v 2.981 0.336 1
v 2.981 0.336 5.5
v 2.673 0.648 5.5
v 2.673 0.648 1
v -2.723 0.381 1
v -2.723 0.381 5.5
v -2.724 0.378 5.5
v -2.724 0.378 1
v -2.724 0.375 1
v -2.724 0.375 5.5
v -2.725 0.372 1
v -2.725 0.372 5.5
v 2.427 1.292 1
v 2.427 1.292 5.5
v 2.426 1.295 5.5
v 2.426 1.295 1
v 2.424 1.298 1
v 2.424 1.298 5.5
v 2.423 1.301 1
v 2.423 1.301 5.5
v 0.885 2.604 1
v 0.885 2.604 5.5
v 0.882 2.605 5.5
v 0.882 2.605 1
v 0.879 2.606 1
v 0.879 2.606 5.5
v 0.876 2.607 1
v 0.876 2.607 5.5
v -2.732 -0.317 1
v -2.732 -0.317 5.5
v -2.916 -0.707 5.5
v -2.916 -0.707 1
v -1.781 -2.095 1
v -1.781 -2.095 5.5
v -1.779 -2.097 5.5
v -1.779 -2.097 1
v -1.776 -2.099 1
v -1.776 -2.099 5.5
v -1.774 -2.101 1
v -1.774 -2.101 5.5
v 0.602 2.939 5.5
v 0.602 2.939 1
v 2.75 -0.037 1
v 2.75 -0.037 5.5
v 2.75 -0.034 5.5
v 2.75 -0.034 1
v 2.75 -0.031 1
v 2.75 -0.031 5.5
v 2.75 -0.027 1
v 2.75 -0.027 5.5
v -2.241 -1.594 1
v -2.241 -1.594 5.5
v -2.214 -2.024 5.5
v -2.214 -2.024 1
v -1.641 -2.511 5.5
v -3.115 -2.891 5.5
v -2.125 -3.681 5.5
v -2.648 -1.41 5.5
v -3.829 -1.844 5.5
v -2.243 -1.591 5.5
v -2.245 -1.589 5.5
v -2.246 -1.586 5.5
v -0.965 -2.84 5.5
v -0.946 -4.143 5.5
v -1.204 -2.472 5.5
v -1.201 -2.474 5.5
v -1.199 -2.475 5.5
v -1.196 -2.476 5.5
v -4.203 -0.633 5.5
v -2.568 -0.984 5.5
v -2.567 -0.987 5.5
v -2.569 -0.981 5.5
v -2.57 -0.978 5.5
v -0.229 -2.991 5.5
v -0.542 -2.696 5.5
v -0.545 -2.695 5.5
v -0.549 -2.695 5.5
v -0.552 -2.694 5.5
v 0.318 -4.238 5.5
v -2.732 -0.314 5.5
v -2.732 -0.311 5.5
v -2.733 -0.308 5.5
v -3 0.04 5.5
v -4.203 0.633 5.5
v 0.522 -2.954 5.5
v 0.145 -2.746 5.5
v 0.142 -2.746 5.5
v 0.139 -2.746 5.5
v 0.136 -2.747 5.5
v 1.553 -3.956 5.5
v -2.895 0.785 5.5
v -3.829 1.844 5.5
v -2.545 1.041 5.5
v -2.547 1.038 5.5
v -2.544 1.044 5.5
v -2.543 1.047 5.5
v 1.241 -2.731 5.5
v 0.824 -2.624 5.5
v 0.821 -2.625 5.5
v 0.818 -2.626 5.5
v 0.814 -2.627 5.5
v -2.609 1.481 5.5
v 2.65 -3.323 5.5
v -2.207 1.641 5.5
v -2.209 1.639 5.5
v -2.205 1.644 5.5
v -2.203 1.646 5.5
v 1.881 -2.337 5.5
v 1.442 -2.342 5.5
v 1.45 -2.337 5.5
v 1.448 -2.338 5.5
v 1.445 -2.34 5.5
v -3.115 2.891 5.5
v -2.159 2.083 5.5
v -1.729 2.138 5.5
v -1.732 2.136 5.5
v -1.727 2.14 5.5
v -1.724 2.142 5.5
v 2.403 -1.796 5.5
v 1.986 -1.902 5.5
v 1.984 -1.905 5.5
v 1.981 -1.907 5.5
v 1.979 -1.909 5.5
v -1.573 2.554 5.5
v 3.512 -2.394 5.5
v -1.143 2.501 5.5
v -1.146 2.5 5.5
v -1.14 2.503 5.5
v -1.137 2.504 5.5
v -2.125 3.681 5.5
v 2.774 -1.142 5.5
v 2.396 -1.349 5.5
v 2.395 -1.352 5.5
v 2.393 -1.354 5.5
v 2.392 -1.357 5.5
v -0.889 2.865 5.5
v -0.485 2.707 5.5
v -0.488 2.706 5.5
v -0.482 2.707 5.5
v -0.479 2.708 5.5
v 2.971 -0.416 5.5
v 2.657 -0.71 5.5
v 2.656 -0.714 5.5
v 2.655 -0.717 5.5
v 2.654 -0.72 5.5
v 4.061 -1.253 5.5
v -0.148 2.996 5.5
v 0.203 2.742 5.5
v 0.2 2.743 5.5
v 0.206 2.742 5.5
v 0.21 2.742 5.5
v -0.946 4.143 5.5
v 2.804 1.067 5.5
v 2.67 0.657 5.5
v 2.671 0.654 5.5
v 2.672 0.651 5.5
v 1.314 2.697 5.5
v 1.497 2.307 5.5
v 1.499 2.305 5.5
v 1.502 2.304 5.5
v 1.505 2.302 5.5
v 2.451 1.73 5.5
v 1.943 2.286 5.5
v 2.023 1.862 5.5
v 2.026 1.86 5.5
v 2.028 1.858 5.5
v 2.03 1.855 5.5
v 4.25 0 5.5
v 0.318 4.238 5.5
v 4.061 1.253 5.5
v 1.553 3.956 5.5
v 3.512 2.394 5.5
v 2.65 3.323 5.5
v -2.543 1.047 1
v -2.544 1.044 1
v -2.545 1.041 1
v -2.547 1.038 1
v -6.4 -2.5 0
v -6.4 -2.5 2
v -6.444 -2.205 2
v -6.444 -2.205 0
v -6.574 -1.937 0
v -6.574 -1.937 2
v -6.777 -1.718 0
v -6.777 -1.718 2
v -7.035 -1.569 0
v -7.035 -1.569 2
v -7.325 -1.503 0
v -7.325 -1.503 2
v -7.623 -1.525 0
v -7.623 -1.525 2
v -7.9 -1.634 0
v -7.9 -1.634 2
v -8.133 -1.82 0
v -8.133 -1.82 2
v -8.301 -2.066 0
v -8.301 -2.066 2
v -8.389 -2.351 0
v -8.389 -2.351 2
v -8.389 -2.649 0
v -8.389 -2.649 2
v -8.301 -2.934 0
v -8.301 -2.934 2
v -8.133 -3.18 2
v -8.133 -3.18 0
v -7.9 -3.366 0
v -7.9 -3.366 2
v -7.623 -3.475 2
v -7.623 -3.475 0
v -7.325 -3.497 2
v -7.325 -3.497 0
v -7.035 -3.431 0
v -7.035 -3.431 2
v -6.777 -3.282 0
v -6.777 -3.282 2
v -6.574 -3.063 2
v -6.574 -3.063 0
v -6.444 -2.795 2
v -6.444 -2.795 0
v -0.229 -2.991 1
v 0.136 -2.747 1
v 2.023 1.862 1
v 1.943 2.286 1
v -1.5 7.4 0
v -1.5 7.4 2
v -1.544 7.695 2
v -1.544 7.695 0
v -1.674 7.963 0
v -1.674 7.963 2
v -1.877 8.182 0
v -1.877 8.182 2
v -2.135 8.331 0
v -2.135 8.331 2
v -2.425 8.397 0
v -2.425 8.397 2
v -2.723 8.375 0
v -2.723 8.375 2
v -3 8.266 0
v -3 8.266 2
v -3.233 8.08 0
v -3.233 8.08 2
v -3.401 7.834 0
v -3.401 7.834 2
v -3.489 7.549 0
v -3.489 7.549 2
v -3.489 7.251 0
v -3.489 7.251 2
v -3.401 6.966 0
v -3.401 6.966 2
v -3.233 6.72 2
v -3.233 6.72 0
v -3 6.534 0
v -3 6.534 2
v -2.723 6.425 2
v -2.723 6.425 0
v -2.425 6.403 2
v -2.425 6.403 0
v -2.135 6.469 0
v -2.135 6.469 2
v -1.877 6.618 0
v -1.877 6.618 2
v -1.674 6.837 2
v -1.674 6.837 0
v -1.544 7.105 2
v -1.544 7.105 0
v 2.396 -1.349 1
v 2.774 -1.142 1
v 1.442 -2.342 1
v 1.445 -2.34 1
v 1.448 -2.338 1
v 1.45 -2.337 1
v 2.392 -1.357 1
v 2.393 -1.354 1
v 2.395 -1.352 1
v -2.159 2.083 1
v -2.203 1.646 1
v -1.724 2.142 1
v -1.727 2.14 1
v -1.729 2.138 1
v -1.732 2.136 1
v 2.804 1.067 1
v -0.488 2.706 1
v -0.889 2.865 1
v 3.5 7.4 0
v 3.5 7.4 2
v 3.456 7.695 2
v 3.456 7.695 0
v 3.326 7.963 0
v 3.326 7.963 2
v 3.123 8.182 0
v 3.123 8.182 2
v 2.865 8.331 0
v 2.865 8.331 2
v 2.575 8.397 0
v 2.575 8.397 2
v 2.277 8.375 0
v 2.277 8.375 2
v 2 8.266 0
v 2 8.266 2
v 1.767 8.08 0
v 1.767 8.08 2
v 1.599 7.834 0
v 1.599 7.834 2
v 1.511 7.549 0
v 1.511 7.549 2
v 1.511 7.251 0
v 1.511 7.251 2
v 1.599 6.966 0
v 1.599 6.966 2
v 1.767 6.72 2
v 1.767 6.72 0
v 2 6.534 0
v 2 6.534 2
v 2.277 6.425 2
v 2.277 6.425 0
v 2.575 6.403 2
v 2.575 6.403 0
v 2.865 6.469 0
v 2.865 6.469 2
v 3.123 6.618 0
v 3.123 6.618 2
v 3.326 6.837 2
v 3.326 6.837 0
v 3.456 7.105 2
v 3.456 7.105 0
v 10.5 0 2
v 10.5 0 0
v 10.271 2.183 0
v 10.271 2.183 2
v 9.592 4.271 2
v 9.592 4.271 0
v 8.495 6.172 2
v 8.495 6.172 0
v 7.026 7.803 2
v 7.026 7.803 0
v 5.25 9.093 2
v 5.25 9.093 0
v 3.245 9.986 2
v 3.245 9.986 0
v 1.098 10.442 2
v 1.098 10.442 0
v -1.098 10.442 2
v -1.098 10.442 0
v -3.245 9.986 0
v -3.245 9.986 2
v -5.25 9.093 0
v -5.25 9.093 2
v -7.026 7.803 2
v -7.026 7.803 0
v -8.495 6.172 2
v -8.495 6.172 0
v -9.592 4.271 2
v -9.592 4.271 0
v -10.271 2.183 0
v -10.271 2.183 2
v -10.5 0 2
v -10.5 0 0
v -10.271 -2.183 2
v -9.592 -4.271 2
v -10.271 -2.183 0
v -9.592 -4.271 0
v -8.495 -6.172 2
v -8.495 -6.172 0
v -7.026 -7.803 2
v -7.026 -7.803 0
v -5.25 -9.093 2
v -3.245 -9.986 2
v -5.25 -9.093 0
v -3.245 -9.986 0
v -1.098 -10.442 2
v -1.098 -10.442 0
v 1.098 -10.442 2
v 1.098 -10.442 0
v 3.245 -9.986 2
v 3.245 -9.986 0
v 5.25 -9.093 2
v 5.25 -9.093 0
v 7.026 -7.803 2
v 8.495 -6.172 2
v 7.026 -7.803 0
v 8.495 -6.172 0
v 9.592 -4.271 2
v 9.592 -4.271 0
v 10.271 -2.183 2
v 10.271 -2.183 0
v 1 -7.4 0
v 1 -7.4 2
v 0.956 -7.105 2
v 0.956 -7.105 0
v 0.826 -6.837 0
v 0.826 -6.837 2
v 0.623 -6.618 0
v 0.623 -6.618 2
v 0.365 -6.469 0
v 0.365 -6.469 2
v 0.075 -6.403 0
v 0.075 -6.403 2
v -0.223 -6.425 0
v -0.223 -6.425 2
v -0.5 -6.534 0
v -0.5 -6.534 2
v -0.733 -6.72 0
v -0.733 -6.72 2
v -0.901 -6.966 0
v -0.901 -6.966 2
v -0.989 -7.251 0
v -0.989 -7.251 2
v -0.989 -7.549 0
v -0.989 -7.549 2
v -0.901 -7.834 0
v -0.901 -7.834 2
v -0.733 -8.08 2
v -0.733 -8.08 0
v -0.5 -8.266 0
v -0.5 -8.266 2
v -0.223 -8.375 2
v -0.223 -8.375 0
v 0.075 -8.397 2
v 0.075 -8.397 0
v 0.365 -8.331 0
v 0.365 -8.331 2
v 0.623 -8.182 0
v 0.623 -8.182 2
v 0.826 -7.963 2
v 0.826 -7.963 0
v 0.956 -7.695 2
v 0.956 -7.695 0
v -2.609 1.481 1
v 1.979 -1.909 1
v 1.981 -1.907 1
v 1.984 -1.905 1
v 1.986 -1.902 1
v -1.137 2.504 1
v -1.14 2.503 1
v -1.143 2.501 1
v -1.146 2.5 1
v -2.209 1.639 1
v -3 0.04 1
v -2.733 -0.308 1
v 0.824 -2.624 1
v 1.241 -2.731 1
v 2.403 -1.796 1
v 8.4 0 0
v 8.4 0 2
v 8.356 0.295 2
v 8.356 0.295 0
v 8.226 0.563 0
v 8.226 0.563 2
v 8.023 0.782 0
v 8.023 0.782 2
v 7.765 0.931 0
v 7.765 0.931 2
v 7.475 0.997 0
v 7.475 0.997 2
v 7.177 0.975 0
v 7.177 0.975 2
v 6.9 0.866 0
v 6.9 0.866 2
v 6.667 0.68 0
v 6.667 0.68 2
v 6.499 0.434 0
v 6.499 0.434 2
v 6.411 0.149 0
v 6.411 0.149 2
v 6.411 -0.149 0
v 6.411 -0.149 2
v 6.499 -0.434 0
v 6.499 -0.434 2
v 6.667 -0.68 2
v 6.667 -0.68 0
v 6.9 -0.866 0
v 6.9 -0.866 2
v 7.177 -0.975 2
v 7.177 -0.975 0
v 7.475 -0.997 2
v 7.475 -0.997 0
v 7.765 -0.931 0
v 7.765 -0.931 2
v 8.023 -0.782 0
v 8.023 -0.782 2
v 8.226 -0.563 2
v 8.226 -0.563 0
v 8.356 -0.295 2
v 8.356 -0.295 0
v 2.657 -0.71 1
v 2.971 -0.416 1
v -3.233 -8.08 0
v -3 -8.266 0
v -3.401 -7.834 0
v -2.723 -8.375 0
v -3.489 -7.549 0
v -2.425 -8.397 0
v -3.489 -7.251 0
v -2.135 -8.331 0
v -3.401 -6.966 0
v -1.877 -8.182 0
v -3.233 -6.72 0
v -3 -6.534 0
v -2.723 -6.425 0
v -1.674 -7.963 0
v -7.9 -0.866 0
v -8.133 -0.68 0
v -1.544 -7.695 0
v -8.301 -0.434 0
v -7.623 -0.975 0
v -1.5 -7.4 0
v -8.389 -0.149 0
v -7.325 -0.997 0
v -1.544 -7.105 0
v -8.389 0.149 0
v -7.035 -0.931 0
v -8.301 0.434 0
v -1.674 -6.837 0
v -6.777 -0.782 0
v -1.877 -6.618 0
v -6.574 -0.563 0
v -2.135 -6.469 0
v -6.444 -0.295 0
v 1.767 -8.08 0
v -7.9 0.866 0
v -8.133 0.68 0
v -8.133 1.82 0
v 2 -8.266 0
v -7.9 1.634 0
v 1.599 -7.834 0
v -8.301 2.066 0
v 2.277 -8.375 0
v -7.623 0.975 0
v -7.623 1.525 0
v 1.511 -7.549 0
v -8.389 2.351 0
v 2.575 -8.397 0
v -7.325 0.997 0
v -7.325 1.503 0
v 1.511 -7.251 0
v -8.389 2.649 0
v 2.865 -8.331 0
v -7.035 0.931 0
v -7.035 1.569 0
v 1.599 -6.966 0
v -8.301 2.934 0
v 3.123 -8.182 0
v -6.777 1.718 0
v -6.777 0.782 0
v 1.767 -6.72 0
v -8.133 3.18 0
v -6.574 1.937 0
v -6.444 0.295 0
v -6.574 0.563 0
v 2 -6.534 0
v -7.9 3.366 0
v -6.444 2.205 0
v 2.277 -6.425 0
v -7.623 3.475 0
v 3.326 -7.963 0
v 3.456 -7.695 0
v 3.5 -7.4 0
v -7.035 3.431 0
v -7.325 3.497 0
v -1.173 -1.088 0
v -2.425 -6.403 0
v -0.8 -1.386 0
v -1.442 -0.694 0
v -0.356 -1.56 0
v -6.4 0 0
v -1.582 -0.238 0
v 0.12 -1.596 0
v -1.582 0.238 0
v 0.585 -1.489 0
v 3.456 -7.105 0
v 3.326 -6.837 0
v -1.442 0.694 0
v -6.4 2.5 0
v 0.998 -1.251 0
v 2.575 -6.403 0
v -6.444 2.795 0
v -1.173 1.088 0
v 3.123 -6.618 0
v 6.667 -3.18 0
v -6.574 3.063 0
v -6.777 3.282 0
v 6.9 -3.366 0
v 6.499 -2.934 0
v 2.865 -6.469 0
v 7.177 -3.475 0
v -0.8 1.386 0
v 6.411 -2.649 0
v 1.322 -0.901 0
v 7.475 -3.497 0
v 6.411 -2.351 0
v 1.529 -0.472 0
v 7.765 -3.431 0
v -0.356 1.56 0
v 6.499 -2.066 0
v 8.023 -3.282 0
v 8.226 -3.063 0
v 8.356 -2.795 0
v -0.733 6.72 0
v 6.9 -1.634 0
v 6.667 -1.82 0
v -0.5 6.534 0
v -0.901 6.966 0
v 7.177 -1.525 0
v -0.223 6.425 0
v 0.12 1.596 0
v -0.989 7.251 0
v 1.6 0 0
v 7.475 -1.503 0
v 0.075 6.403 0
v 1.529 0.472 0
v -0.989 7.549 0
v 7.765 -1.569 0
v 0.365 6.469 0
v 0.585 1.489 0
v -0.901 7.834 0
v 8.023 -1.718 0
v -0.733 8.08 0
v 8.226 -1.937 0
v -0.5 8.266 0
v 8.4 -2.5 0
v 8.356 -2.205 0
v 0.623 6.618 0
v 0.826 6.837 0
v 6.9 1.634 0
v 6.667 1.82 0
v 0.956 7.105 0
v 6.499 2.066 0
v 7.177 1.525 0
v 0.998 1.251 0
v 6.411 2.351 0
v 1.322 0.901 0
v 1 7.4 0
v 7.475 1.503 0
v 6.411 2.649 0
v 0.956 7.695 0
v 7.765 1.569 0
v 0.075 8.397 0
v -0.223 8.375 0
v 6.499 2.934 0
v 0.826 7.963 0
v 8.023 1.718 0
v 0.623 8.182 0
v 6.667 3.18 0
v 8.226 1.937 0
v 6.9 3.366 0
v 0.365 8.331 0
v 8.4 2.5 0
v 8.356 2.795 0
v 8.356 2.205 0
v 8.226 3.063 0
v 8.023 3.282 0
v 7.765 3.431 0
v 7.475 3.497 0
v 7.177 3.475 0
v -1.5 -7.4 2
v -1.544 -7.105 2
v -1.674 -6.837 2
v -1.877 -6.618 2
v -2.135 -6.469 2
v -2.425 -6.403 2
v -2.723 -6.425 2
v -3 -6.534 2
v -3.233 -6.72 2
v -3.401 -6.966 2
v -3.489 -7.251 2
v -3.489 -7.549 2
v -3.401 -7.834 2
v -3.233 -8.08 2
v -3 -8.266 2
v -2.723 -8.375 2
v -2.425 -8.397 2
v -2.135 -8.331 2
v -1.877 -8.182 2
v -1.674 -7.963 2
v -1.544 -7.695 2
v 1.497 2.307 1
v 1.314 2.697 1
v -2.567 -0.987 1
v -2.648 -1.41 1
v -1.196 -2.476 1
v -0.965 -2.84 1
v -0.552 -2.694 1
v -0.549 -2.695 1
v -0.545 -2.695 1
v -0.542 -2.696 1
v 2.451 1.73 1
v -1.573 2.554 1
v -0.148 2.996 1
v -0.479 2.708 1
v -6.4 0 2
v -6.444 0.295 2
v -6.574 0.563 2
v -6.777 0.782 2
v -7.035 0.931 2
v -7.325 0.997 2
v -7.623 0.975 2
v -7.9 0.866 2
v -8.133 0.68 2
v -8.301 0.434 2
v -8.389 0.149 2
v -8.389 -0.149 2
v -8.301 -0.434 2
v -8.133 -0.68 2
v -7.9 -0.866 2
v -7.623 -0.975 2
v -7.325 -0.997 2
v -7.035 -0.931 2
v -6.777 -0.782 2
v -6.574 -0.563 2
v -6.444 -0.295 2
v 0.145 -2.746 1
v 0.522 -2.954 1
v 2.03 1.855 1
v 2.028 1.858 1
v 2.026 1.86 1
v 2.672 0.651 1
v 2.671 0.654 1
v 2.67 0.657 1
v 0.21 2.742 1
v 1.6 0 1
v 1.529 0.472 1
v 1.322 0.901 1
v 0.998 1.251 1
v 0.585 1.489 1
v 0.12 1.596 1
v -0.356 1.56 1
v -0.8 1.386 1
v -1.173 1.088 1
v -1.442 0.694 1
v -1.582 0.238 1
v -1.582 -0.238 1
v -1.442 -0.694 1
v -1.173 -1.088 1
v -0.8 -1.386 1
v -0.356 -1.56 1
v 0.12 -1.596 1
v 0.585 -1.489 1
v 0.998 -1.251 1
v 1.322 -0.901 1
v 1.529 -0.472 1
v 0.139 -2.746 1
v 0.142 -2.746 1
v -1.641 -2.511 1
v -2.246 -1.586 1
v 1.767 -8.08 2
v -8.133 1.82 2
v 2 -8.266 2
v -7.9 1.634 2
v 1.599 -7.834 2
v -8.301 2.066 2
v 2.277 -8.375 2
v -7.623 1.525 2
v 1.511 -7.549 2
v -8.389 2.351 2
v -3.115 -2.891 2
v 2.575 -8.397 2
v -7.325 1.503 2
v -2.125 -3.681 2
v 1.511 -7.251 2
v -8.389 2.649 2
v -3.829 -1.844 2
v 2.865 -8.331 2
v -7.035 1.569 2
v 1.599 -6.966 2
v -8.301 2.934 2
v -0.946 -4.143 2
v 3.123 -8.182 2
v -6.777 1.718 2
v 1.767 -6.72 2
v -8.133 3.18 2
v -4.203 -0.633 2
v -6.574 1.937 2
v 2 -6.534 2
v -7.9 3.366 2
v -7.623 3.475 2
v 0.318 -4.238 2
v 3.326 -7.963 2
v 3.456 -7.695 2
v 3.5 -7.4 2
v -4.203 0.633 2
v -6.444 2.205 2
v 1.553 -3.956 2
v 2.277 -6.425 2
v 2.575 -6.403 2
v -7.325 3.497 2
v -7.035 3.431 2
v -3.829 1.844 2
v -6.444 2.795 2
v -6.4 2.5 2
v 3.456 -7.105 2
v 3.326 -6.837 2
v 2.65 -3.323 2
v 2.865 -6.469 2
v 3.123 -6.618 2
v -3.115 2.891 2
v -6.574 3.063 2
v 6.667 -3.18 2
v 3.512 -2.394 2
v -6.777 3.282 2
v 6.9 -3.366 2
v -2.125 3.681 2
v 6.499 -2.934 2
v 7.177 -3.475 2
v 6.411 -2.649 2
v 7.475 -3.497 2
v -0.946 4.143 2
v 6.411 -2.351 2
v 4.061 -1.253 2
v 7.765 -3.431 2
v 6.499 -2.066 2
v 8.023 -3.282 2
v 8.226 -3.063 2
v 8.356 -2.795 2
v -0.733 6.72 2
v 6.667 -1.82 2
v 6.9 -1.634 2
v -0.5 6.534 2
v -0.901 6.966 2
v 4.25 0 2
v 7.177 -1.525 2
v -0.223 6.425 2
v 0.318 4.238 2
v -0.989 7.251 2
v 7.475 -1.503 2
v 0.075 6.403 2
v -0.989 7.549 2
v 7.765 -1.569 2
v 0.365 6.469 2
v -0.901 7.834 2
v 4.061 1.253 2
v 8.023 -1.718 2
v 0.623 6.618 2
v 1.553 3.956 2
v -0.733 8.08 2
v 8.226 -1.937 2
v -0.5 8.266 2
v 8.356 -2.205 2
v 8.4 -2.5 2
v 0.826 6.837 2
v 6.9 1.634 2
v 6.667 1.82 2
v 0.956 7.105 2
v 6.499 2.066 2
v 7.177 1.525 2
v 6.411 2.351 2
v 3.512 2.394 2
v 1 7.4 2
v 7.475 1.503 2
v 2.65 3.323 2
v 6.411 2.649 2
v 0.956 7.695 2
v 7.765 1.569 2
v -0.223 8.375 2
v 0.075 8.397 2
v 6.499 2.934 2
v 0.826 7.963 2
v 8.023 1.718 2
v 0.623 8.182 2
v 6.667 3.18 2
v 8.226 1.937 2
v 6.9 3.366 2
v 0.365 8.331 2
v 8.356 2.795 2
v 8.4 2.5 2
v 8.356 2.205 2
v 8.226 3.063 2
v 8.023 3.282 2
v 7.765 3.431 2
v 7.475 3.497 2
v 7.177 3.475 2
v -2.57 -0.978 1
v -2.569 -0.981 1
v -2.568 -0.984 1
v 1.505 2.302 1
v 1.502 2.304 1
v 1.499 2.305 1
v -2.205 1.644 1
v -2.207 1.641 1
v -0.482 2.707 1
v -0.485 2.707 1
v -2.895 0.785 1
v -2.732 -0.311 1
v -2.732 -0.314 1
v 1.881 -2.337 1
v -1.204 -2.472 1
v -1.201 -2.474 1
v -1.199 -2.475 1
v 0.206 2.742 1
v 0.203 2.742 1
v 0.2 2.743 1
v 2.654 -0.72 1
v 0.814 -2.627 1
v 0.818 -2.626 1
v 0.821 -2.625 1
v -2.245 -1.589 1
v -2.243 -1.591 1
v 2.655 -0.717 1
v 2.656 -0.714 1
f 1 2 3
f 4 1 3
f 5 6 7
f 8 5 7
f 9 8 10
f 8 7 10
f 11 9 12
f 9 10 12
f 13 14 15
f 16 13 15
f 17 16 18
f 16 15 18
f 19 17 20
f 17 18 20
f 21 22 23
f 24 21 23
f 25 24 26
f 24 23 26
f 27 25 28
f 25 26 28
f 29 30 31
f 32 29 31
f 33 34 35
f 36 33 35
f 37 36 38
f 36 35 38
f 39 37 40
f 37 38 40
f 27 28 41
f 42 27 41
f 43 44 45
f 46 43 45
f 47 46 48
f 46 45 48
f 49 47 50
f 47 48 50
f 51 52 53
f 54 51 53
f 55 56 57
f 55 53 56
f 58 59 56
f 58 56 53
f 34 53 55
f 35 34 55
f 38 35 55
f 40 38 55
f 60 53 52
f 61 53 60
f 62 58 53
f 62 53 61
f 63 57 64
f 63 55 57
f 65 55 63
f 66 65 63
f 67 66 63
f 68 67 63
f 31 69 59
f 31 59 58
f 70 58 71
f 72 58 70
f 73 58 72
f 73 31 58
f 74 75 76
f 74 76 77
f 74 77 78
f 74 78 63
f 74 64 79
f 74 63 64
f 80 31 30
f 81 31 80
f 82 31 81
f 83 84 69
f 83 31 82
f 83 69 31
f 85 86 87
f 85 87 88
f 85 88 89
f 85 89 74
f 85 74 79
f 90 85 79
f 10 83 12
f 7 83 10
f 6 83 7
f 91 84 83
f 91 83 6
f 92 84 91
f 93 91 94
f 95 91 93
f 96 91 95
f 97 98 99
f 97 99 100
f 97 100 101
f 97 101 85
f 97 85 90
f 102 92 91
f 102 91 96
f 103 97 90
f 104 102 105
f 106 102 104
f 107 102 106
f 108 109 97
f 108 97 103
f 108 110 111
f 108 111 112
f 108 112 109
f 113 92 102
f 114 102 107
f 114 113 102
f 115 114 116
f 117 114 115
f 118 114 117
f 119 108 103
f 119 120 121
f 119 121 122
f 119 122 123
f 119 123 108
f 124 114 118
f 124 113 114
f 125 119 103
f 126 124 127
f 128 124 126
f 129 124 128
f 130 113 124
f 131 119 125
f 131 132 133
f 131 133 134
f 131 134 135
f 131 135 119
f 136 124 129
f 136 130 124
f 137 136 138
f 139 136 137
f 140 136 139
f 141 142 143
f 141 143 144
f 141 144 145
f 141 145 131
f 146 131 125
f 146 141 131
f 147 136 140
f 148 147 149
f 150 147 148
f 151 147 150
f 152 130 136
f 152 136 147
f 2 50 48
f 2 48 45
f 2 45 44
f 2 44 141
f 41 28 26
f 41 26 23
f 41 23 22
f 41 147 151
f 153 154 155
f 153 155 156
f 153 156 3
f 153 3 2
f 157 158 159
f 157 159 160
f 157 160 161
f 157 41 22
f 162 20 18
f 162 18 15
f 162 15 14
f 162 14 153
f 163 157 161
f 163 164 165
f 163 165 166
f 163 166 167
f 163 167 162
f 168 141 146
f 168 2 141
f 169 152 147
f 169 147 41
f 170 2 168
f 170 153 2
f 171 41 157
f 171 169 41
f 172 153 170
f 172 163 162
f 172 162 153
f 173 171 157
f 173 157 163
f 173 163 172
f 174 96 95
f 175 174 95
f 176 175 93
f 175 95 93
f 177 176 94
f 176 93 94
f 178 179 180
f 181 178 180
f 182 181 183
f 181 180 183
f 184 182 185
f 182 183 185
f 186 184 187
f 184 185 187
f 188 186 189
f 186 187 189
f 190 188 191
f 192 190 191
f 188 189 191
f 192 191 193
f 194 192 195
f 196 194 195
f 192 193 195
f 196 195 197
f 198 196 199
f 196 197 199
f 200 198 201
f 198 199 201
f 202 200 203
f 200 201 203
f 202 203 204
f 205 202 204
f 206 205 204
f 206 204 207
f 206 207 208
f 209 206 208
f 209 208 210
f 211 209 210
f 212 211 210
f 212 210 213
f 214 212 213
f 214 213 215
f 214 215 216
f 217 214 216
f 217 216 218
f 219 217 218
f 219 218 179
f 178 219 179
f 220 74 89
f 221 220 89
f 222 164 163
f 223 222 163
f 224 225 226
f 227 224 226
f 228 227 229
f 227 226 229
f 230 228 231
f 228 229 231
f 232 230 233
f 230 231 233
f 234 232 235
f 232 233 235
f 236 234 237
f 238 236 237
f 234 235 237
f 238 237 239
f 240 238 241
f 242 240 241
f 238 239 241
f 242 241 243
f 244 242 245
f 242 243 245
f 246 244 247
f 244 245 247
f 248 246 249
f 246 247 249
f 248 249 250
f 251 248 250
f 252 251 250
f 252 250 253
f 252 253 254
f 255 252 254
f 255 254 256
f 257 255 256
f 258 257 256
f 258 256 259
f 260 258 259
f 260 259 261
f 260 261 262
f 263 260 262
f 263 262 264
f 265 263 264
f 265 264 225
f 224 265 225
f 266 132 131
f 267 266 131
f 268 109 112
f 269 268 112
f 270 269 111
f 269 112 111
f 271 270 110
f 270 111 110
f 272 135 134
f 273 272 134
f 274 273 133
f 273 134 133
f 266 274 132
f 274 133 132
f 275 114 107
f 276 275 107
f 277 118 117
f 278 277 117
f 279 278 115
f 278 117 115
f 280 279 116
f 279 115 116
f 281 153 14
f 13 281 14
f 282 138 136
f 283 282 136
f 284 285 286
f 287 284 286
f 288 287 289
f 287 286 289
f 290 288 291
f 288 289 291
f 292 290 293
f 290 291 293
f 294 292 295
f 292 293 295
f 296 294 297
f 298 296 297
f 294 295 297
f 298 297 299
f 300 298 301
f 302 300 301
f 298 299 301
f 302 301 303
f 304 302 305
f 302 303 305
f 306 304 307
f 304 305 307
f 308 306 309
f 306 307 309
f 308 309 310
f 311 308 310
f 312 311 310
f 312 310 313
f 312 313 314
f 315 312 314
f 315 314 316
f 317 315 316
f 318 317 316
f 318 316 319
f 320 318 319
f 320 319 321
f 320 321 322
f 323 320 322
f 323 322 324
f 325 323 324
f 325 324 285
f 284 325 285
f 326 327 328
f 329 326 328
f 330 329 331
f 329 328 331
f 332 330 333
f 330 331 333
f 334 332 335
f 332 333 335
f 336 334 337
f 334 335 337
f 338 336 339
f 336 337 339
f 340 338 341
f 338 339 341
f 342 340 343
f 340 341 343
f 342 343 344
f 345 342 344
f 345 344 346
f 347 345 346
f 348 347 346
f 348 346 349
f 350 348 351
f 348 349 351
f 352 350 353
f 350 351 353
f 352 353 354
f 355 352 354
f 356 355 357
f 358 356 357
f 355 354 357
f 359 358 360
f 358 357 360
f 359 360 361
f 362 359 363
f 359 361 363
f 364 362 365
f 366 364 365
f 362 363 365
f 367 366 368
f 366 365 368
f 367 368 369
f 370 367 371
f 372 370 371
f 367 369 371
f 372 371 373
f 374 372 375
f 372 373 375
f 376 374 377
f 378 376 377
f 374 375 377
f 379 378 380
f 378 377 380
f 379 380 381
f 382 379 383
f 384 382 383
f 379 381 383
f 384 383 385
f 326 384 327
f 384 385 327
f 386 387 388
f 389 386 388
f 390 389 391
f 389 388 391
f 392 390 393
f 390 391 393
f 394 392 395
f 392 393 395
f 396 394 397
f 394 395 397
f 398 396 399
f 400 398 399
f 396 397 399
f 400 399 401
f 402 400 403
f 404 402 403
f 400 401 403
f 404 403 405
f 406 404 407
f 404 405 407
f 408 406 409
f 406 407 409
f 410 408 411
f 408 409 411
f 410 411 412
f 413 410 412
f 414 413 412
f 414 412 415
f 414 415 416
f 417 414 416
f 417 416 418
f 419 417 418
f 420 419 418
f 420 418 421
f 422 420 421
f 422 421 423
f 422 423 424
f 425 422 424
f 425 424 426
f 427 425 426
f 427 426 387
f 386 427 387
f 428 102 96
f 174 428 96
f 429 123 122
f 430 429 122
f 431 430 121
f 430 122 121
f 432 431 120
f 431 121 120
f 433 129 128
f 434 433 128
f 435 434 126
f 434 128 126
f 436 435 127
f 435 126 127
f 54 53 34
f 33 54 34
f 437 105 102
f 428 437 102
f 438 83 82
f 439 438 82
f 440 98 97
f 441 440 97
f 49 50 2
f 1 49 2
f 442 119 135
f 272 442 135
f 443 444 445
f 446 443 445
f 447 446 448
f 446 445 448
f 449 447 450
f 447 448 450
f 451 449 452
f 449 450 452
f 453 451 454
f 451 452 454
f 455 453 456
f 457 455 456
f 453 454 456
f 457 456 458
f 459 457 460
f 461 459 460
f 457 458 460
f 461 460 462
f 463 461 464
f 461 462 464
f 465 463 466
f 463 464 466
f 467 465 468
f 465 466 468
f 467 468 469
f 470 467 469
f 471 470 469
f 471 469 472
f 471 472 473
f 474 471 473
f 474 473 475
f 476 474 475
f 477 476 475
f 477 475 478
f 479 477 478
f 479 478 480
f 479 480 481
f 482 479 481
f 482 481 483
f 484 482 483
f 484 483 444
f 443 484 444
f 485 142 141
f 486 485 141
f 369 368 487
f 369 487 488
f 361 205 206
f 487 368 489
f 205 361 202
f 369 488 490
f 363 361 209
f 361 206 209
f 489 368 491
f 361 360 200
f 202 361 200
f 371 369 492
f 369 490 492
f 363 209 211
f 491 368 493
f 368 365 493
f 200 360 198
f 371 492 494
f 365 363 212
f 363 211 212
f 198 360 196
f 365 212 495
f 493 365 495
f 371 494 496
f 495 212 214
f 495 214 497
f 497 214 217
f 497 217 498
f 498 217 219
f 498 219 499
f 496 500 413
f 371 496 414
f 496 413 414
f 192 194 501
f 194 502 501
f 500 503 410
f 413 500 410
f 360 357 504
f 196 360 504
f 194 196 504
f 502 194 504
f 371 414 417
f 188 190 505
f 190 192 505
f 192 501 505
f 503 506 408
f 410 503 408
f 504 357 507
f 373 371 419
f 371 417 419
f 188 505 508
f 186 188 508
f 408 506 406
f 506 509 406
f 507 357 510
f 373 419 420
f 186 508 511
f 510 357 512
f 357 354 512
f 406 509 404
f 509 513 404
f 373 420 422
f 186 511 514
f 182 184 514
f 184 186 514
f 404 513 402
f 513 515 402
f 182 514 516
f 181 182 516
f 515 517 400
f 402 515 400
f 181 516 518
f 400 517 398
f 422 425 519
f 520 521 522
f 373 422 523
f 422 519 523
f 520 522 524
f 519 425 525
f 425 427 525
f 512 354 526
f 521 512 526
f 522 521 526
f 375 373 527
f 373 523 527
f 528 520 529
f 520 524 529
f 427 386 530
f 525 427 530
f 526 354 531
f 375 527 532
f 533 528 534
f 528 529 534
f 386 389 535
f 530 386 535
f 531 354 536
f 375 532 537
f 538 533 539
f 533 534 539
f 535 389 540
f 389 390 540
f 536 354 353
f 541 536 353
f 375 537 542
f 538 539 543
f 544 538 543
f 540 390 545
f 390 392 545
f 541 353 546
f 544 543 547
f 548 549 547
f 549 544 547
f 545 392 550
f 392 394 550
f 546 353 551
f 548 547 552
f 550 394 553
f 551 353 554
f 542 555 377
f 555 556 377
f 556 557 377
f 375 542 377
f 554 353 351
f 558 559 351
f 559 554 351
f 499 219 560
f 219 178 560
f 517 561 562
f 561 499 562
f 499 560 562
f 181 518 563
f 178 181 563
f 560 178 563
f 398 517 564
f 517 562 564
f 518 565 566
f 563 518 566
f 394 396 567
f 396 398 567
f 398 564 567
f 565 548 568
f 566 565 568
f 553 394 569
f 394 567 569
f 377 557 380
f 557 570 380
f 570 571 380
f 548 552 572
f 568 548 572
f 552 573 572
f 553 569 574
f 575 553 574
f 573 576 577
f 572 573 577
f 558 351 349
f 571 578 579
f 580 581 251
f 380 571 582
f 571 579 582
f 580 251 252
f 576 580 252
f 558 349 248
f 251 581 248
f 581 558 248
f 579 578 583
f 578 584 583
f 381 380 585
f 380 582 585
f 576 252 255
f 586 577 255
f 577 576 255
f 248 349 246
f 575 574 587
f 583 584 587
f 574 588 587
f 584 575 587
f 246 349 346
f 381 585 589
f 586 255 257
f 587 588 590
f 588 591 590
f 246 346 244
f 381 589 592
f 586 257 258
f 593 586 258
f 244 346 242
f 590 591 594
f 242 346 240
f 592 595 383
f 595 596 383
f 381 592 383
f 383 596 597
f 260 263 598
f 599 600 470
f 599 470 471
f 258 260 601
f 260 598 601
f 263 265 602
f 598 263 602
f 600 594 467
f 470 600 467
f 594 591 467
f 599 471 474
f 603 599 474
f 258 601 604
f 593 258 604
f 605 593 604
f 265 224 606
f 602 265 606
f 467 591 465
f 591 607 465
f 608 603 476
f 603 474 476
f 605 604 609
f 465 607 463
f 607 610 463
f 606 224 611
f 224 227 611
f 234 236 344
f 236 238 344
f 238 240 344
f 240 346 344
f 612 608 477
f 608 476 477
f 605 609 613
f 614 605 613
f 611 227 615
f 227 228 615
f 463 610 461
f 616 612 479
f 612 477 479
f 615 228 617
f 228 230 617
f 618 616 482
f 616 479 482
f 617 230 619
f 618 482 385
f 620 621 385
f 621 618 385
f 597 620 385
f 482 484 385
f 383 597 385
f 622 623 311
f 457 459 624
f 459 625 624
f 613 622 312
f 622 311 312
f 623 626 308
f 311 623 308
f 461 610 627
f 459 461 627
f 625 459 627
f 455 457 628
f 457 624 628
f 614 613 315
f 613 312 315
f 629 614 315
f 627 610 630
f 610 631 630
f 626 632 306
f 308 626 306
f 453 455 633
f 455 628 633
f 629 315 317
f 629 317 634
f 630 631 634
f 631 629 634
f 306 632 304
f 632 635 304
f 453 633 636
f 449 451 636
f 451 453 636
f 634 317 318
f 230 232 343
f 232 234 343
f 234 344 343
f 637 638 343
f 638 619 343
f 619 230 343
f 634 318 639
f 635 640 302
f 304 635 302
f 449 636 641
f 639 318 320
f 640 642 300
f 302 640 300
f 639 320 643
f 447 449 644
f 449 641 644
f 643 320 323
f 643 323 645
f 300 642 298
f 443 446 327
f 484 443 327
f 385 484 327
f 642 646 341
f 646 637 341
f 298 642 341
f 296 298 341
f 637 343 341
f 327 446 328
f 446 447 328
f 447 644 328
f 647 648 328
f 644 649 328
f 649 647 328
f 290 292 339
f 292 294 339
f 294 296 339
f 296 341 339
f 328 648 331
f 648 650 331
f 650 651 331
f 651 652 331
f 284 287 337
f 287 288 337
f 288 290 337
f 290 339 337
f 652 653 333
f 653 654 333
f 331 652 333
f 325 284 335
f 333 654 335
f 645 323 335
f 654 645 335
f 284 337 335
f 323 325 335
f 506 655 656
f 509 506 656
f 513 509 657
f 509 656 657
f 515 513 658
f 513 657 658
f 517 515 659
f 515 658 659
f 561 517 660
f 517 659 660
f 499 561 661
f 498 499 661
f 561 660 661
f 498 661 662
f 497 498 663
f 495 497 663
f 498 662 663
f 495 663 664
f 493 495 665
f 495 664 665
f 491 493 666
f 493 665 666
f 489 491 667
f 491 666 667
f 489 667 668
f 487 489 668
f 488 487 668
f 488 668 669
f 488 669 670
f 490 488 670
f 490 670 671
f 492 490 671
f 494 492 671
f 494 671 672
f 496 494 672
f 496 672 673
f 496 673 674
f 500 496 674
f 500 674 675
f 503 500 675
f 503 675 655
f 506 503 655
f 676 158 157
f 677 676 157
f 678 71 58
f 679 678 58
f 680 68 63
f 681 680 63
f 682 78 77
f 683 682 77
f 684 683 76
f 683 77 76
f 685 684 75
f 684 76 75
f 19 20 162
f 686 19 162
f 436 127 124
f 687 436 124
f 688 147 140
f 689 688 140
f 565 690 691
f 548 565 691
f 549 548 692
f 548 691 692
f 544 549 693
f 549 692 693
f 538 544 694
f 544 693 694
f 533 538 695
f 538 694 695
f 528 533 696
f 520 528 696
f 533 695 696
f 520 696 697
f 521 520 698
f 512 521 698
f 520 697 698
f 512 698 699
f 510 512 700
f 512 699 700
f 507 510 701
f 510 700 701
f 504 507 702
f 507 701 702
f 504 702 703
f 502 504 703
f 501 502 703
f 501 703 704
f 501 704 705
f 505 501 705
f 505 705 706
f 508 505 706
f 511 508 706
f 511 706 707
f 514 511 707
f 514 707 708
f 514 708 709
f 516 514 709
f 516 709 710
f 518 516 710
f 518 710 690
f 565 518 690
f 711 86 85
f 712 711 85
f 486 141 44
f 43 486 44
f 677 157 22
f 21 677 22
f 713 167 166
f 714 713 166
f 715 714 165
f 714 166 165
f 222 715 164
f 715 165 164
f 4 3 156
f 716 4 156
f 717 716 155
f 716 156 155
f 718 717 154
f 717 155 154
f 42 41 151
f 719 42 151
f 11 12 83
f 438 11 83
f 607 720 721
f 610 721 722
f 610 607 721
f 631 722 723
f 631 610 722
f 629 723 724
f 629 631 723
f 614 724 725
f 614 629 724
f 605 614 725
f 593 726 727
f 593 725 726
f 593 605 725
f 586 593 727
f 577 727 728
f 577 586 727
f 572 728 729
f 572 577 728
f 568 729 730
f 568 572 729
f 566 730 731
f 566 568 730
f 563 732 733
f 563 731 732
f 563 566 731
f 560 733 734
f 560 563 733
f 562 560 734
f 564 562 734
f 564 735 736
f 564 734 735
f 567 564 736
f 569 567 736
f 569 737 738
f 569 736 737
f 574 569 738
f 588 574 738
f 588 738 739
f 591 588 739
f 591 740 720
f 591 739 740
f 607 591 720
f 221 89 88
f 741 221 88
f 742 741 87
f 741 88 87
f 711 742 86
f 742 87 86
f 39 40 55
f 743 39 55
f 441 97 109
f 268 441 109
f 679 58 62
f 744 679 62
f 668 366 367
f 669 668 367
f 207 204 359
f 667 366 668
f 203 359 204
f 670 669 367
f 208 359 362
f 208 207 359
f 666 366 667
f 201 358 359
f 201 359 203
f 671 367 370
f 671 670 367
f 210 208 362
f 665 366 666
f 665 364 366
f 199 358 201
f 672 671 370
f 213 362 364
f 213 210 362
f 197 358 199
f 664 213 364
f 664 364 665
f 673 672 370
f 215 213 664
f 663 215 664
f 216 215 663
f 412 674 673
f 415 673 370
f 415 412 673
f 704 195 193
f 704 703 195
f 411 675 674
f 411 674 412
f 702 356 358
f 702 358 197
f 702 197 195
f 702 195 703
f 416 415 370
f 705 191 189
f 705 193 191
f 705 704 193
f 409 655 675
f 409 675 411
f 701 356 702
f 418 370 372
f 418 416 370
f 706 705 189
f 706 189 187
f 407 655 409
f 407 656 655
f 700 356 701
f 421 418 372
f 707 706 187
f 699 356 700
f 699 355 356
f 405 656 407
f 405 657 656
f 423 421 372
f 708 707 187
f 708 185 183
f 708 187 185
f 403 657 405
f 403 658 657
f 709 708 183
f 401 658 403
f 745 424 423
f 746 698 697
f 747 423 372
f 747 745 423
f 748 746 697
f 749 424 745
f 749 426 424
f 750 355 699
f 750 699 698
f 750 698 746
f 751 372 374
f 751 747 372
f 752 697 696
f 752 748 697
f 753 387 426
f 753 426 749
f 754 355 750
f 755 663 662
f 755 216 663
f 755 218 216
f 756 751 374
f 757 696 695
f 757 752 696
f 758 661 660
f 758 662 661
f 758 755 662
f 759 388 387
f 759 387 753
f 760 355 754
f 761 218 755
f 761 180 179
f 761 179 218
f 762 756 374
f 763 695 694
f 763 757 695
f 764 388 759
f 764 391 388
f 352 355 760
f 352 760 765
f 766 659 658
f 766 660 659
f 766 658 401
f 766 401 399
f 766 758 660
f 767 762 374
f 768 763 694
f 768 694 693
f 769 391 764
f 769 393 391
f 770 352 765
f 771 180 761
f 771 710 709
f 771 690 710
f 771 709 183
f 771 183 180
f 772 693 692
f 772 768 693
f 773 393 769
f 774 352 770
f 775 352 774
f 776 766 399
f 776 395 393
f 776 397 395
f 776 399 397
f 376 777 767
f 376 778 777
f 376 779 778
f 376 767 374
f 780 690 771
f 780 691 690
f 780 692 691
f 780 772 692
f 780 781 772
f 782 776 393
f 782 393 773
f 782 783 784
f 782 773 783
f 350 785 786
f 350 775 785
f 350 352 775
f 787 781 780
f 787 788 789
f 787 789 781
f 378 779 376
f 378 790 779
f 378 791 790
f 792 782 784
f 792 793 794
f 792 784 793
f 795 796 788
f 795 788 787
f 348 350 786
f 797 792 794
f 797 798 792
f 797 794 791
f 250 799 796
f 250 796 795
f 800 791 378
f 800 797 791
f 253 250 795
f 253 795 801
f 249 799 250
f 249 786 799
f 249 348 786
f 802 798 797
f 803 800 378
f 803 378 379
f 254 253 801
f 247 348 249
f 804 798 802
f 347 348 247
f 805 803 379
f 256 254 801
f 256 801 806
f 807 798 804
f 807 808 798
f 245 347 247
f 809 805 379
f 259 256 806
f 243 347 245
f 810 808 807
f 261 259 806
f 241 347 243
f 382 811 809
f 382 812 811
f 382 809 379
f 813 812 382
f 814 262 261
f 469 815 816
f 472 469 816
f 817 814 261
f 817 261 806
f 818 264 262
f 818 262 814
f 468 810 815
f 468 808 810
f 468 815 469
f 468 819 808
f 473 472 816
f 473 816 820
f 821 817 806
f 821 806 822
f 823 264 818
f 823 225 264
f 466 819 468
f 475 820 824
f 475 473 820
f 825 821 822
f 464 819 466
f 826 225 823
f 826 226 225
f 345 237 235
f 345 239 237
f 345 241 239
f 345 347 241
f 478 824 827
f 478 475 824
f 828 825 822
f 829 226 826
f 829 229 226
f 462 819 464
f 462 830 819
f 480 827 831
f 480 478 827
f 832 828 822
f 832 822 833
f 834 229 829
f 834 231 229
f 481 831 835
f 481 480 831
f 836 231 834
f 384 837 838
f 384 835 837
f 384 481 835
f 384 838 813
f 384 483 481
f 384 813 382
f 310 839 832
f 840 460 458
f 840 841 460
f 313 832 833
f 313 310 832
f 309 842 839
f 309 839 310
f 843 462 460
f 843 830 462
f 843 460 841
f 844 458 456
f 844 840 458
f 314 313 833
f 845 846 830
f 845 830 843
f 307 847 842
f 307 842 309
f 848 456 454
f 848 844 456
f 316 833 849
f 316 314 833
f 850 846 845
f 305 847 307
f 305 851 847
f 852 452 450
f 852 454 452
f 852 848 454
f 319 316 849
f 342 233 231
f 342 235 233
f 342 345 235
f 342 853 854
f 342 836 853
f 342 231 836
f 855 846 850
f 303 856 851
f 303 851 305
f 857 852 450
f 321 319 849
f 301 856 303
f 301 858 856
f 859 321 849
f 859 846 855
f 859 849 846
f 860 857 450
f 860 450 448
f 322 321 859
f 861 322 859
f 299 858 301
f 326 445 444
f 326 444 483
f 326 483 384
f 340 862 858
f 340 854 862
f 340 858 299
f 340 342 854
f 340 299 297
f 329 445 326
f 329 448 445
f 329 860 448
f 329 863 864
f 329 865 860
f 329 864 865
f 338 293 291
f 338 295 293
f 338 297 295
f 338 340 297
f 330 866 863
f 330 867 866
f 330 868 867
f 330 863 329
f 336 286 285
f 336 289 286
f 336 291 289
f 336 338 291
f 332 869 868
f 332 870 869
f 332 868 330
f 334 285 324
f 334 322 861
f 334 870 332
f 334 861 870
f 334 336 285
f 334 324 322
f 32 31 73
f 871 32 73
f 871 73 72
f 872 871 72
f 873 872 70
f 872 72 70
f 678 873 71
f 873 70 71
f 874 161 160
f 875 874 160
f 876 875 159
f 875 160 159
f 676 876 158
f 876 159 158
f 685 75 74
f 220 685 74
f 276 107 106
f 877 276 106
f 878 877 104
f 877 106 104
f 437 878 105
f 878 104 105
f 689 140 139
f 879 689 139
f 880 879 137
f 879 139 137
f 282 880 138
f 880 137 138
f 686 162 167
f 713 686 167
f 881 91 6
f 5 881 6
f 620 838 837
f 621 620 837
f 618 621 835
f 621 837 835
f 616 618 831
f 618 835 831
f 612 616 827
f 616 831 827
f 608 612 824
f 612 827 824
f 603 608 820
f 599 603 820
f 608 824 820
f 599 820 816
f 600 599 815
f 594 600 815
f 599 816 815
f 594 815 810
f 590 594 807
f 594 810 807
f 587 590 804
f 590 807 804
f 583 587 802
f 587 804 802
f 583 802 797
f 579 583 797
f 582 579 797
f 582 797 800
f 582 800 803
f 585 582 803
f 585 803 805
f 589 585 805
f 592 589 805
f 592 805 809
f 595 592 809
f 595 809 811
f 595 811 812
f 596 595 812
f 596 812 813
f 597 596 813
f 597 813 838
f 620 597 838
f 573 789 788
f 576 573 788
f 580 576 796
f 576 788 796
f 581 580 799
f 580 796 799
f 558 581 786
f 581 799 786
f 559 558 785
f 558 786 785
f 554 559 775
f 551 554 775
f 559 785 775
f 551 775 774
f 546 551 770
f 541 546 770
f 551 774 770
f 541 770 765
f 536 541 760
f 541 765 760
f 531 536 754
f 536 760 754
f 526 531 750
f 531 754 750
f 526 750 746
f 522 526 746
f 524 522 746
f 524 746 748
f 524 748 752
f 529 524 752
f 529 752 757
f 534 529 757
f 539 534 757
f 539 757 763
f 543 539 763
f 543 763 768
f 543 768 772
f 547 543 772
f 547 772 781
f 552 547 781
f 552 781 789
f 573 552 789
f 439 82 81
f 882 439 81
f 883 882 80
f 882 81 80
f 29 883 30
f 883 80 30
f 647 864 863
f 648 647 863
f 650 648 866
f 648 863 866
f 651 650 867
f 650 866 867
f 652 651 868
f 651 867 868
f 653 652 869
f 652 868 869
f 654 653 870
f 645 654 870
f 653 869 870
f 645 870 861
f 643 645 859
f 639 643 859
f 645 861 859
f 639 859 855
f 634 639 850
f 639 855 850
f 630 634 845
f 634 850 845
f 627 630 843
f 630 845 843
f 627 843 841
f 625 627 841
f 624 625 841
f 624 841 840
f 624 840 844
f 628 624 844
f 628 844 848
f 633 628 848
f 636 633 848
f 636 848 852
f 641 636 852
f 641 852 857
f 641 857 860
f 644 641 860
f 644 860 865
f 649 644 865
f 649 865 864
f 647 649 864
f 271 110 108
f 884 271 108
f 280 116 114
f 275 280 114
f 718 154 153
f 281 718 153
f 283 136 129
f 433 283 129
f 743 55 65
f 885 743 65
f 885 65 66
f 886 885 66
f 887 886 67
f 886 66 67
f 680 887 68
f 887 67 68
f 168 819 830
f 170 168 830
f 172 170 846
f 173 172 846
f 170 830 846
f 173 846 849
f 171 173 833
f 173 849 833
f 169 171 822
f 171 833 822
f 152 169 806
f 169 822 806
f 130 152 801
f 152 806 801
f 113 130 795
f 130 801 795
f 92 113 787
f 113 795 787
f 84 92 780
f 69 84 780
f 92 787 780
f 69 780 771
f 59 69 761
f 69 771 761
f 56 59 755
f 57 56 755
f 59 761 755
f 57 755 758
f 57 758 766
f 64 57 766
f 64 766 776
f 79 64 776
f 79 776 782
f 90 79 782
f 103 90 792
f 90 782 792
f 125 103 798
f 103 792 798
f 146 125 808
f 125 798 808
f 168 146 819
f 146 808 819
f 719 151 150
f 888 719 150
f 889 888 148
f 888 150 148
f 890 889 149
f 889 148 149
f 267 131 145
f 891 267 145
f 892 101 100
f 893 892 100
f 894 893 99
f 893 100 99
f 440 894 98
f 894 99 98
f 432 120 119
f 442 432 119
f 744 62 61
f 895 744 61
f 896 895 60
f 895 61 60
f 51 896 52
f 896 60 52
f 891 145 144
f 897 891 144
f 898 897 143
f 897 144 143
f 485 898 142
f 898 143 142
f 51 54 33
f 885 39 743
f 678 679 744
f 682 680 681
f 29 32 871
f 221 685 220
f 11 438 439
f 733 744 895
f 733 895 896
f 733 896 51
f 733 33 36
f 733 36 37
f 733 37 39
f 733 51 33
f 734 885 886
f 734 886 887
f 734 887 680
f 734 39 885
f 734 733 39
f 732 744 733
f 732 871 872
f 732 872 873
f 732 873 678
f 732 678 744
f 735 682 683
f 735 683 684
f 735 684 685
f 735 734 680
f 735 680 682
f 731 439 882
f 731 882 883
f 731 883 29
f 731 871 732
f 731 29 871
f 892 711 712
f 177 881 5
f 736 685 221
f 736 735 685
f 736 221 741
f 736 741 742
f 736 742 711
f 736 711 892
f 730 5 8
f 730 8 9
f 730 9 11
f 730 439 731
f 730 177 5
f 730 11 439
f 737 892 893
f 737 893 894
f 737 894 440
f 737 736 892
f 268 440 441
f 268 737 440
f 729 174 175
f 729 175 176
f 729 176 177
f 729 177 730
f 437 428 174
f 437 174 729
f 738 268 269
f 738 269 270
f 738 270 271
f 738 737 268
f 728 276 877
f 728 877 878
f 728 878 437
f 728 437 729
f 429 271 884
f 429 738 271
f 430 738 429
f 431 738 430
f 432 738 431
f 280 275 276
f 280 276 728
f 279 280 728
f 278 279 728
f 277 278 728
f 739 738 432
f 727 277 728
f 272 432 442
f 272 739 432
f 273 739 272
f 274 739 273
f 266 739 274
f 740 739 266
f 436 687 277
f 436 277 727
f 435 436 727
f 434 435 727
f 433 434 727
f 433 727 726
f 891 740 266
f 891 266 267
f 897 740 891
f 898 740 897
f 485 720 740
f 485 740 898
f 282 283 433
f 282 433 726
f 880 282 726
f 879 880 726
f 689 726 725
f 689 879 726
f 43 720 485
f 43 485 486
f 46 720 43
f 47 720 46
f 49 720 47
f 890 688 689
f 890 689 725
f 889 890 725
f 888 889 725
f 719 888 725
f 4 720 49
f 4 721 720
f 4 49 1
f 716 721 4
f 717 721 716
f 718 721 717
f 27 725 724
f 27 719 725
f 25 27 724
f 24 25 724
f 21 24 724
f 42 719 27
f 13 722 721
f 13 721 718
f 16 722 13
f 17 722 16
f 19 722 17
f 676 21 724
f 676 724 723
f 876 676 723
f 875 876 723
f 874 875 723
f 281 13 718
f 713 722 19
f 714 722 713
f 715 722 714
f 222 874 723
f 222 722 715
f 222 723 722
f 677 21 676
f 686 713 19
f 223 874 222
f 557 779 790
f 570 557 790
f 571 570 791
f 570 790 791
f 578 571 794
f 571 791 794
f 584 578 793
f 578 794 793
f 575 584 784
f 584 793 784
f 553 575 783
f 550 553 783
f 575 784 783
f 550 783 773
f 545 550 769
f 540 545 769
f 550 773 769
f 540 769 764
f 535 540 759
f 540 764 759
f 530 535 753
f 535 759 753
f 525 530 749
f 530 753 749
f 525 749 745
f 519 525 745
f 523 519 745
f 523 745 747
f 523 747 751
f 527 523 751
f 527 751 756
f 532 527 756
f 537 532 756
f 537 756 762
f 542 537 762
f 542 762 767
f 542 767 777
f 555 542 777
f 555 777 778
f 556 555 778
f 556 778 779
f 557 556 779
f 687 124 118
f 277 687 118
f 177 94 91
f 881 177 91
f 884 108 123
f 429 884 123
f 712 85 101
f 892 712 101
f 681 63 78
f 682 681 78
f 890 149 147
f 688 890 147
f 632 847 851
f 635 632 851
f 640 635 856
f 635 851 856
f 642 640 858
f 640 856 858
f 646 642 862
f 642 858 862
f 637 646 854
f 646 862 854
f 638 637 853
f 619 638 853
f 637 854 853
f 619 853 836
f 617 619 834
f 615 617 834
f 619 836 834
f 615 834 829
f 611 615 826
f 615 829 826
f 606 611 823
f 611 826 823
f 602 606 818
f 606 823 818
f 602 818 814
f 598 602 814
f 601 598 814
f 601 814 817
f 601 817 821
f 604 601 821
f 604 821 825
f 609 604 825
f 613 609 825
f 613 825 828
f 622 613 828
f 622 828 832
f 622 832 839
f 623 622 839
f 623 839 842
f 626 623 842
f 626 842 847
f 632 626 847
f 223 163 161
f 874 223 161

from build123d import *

# Parameters (mm, degrees)
SKETCH1_R           = 10.5
BOSS_EXTRUDE1_DEPTH = 2
SKETCH2_R           = 4.25
BOSS_EXTRUDE2_DEPTH = 3.5
SKETCH3_R           = 2.75
CUT_EXTRUDE1_DEPTH  = 4.5
SKETCH4_R           = 1.6
CUT_EXTRUDE2_DEPTH  = 3.5
SKETCH5_R           = 1
CUT_EXTRUDE3_DEPTH  = 3.5
CUT_EXTRUDE4_DEPTH  = 4.5
CIRPATTERN1_COUNT   = 25


with BuildPart() as part:
    # Sketch1 → Boss-Extrude1 (new body)
    with BuildSketch(Plane.XY):
        Circle(SKETCH1_R)
    extrude(amount=BOSS_EXTRUDE1_DEPTH)

    # Sketch2 → Boss-Extrude2 (add)
    with BuildSketch(Plane.XY.offset(2)):
        Circle(SKETCH2_R)
    extrude(amount=BOSS_EXTRUDE2_DEPTH)

    # Sketch3 → Cut-Extrude1 (cut)
    with BuildSketch(Plane.XY.offset(5.5)):
        Circle(SKETCH3_R)
    extrude(amount=-CUT_EXTRUDE1_DEPTH, mode=Mode.SUBTRACT)

    # Sketch4 → Cut-Extrude2 (cut)
    with BuildSketch(Plane.XY):
        Circle(SKETCH4_R)
    extrude(amount=CUT_EXTRUDE2_DEPTH, mode=Mode.SUBTRACT)

    # Sketch5 → Cut-Extrude3 (cut)
    with BuildSketch(Plane.XY.offset(2)):
        with Locations((0, 7.4)):
            Circle(SKETCH5_R)
        with Locations((-2.5, 7.4)):
            Circle(SKETCH5_R)
        with Locations((2.5, 7.4)):
            Circle(SKETCH5_R)
        with Locations((2.5, -7.4)):
            Circle(SKETCH5_R)
        with Locations((-2.5, -7.4)):
            Circle(SKETCH5_R)
        with Locations((0, -7.4)):
            Circle(SKETCH5_R)
        with Locations((7.4, 0)):
            Circle(SKETCH5_R)
        with Locations((7.4, 2.5)):
            Circle(SKETCH5_R)
        with Locations((7.4, -2.5)):
            Circle(SKETCH5_R)
        with Locations((-7.4, -2.5)):
            Circle(SKETCH5_R)
        with Locations((-7.4, 2.5)):
            Circle(SKETCH5_R)
        with Locations((-7.4, 0)):
            Circle(SKETCH5_R)
    extrude(amount=-CUT_EXTRUDE3_DEPTH, mode=Mode.SUBTRACT)

    # Sketch6 → Cut-Extrude4 (cut)
    with BuildSketch(Plane.XY.offset(5.5)):
        with BuildLine():
            Line((-2.895429002, 0.78516934), (-2.654143252, 0.719738562))
            ThreePointArc((-2.654143252, 0.719738562), (-2.605253752, 0.880427673), (-2.546645605, 1.037832435))
            Line((-2.546645605, 1.037832435), (-2.895429002, 0.78516934))
        make_face()
        with BuildLine():
            Line((-2.895429002, 0.78516934), (-2.723421701, 0.381410852))
            ThreePointArc((-2.723421701, 0.381410852), (-2.694098665, 0.551663288), (-2.654143252, 0.719738562))
            Line((-2.654143252, 0.719738562), (-2.895429002, 0.78516934))
        make_face()
    cut_extrude4 = extrude(amount=-CUT_EXTRUDE4_DEPTH, mode=Mode.SUBTRACT)

    # CirPattern1: Cut-Extrude4 ×25 about axis
    cirpattern1_axis = Axis((0, 0, 0), (0, 0, 1))
    for i in range(1, CIRPATTERN1_COUNT):
        add(cut_extrude4.rotate(cirpattern1_axis, i * 360 / CIRPATTERN1_COUNT), mode=Mode.SUBTRACT)


solid = part.part
